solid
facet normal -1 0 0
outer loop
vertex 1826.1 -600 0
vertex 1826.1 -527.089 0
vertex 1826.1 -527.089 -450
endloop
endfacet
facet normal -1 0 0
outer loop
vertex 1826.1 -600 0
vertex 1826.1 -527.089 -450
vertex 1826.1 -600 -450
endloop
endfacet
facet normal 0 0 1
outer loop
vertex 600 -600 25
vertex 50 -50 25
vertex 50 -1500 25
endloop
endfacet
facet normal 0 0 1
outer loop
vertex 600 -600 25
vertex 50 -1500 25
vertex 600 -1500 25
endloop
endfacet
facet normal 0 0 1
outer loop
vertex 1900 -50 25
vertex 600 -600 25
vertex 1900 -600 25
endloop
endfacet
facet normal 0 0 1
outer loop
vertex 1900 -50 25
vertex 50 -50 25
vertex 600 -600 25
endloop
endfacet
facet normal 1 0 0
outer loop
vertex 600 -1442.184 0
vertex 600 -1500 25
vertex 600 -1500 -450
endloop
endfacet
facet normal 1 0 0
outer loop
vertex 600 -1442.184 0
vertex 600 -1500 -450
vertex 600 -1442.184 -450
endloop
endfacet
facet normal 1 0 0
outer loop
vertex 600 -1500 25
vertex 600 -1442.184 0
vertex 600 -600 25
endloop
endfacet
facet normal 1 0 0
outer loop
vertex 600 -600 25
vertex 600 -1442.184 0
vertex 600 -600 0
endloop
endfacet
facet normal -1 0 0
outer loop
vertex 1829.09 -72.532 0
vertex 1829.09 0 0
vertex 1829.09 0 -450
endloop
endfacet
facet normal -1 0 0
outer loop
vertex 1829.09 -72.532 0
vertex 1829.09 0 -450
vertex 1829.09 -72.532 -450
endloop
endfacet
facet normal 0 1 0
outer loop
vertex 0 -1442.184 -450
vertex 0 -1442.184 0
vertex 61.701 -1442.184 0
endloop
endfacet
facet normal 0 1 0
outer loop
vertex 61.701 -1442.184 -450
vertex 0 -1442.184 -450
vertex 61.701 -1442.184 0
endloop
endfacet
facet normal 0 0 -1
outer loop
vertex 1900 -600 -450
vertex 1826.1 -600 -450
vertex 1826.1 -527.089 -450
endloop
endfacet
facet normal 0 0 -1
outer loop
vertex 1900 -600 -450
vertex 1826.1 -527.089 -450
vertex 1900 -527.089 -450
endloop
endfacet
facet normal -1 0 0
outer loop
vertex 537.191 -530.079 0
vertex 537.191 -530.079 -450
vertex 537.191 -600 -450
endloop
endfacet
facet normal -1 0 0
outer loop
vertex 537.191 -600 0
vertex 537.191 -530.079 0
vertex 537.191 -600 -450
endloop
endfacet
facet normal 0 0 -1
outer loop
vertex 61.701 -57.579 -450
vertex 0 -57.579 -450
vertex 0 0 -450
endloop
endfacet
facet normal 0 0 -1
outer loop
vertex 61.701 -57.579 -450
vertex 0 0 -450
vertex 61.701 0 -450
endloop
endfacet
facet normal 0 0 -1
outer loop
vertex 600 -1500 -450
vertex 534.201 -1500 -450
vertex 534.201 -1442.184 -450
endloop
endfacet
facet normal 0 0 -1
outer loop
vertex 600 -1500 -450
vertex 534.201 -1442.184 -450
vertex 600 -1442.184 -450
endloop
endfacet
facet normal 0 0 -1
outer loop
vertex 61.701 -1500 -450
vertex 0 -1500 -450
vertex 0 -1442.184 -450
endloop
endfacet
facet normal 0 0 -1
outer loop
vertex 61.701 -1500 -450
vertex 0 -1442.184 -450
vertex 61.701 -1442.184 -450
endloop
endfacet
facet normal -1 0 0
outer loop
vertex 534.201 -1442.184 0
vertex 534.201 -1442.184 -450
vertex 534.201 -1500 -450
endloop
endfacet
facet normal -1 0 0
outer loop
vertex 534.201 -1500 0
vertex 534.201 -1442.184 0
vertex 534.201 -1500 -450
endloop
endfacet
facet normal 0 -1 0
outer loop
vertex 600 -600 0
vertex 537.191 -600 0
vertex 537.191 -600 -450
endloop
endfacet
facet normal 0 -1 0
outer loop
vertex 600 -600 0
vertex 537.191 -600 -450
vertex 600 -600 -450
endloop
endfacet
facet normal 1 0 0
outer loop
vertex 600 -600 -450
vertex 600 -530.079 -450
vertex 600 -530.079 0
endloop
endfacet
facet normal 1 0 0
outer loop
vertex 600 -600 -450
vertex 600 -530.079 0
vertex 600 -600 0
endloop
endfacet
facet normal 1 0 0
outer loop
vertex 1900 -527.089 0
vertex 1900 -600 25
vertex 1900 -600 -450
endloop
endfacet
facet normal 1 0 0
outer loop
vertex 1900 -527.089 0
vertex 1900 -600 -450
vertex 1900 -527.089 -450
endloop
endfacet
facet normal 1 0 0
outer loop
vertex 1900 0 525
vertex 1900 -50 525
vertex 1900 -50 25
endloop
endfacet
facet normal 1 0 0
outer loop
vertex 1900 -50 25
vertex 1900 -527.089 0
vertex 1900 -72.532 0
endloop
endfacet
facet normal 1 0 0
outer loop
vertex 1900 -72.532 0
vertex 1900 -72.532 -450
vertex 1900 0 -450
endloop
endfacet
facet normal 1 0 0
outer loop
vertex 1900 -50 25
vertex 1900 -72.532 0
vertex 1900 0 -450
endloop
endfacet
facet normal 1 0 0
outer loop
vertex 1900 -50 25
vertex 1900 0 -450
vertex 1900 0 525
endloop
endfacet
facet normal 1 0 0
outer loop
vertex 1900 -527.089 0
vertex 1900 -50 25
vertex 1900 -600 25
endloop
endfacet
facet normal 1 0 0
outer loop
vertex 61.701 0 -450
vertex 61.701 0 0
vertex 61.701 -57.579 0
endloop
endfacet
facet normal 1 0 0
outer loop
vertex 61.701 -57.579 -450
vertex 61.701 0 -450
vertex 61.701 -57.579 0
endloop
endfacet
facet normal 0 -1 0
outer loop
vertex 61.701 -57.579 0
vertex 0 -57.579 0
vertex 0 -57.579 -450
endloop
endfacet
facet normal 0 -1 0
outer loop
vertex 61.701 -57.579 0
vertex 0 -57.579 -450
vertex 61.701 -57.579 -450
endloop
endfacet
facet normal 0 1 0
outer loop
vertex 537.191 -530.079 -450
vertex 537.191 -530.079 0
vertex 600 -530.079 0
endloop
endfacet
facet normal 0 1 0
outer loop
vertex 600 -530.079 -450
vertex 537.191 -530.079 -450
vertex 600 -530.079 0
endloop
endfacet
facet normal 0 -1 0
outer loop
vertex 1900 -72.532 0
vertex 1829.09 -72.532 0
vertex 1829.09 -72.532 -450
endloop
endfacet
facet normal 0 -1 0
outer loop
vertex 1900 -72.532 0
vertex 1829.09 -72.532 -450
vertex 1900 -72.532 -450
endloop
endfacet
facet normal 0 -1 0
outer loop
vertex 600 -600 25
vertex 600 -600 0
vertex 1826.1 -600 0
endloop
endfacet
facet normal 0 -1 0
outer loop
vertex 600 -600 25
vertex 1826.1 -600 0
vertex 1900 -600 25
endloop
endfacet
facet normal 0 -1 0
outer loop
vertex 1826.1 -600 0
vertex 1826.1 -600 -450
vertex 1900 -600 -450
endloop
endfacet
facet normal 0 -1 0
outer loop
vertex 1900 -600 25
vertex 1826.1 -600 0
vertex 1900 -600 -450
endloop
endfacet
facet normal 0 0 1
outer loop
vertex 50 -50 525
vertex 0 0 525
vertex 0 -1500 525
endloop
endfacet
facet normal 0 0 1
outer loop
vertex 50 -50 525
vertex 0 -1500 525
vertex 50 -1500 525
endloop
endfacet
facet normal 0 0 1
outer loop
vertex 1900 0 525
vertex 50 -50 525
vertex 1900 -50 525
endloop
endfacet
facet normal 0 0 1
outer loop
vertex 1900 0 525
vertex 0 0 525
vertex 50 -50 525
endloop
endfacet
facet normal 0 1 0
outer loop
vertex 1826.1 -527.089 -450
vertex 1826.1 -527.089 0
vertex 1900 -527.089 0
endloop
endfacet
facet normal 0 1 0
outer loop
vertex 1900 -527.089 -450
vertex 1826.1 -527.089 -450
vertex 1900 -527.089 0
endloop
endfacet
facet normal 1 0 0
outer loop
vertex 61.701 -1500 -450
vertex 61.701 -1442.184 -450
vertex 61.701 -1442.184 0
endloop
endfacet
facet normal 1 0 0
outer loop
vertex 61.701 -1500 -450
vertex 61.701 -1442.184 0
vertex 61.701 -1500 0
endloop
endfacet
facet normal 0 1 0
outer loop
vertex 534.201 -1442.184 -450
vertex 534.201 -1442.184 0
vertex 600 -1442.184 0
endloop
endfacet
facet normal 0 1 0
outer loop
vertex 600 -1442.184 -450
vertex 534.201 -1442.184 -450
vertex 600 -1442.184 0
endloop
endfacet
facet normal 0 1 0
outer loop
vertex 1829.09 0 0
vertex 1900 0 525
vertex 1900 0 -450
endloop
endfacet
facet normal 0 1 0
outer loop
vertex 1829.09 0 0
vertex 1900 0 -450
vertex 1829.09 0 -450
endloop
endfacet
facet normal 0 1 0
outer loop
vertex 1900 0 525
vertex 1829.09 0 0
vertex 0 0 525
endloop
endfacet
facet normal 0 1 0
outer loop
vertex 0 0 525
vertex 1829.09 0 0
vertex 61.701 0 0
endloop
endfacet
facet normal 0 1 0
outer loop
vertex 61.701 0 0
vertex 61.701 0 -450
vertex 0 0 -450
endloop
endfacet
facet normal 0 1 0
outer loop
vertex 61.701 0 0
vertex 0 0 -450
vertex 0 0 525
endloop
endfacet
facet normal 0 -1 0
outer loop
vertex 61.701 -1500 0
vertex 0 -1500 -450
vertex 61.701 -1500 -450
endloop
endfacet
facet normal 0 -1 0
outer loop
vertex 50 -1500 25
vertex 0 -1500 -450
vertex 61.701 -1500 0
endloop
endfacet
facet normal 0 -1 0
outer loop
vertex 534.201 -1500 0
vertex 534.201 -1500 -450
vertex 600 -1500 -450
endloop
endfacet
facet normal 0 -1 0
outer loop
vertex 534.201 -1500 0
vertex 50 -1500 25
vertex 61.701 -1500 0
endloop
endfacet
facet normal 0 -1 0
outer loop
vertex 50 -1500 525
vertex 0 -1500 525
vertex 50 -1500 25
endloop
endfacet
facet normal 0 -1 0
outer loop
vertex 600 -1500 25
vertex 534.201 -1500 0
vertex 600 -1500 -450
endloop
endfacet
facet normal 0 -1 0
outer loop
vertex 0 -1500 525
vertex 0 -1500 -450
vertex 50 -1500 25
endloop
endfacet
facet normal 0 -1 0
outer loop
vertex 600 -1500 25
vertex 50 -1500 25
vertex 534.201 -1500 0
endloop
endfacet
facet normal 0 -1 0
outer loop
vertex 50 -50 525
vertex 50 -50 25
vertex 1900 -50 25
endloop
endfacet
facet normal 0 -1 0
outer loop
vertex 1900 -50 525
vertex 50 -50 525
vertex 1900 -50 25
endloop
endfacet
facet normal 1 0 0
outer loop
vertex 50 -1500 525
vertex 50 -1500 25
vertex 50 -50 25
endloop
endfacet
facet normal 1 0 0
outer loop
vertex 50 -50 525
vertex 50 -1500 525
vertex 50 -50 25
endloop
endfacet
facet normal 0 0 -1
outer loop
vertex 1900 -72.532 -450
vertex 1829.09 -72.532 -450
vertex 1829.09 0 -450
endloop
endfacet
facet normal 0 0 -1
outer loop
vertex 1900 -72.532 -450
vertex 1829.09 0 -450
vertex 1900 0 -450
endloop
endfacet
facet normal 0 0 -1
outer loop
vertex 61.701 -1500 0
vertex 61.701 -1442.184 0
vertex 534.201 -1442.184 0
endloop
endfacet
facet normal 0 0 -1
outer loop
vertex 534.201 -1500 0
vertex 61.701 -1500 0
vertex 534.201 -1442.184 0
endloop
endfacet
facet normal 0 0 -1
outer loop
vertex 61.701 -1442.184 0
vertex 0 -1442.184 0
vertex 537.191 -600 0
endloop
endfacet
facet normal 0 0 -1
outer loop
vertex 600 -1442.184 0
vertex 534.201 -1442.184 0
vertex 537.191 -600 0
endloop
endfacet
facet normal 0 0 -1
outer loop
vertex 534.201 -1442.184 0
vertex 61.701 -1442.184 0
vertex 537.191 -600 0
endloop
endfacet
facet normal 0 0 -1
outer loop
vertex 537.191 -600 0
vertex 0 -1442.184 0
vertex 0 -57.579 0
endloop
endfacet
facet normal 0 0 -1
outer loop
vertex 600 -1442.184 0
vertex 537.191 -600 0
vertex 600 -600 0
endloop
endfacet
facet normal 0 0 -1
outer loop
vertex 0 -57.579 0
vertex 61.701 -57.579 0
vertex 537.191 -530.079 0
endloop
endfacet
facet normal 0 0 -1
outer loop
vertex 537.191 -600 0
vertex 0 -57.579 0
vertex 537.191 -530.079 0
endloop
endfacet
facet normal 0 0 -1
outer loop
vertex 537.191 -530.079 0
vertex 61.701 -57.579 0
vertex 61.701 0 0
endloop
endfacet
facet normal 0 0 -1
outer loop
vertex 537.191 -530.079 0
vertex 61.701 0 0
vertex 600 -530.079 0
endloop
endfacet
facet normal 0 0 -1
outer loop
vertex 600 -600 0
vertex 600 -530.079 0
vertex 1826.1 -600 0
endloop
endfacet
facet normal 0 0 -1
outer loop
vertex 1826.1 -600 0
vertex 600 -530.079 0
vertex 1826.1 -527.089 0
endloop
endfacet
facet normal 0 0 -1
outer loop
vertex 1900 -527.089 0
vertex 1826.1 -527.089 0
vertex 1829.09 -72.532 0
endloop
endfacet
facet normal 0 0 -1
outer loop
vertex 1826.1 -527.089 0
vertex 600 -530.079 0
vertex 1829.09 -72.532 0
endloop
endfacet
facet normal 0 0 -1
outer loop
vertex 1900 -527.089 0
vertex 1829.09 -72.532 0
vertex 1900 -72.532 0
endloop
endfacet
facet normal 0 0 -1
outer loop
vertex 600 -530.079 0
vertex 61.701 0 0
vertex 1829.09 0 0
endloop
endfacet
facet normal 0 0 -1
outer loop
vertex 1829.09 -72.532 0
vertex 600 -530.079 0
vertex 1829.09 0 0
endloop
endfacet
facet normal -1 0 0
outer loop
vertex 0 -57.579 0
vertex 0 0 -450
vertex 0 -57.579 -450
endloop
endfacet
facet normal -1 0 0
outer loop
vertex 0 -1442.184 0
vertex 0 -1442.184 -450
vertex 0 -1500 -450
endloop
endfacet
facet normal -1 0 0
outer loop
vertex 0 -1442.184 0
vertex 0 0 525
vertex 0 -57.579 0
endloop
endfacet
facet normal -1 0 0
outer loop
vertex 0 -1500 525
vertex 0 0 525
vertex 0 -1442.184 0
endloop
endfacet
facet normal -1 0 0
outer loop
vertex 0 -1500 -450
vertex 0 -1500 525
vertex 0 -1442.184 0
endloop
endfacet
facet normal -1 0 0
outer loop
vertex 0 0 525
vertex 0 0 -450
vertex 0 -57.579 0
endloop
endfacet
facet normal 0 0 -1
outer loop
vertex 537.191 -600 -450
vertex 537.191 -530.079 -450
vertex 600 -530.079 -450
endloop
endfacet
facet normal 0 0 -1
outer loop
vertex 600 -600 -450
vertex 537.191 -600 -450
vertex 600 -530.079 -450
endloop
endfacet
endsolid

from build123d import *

# Parameters (mm, degrees)
F1_DEPTH = 25
F3_DEPTH = 500
F4_W     = 61.7009438574
F4_H     = 57.8163862228
F4_W_2   = 65.7990336418
F4_W_3   = 62.8085494041
F4_H_2   = 69.920873642
F4_H_3   = 57.5791224837
F4_W_4   = 73.9003658295
F4_H_4   = 72.9114174843
F4_W_5   = 70.9098815918
F4_H_5   = 72.5316330791
F5_DEPTH = 450


with BuildPart() as f1:
    # F0 (on Top) → F1 (new body)
    with BuildSketch(Plane.XY):
        Polygon((1900, 0), (0, 0), (0, -600), (0, -1500), (600, -1500), (600, -600), (1900, -600), align=None)
    extrude(amount=F1_DEPTH)

    # F2 (on face) → F3 (join)
    with BuildSketch(Plane.XY.offset(25)):
        Polygon((1900, -50), (1900, 0), (0, 0), (0, -50), (0, -231.5181791782), (0, -1500), (50, -1500), (50, -50), align=None)
    extrude(amount=F3_DEPTH)

    # F4 (on face) → F5 (join)
    with BuildSketch(Plane(origin=(0, 0, 0), x_dir=(1, 0, 0), z_dir=(0, 0, -1))):
        with Locations((30.8504719287, 1471.0918068886)):
            Rectangle(F4_W, F4_H)
        with Locations((567.1004831791, 1471.0918068886)):
            Rectangle(F4_W_2, F4_H)
        with Locations((568.5957252979, 565.039563179)):
            Rectangle(F4_W_3, F4_H_2)
        with Locations((30.8504719287, 28.7895612419)):
            Rectangle(F4_W, F4_H_3)
        with Locations((1863.0498170853, 563.5442912579)):
            Rectangle(F4_W_4, F4_H_4)
        with Locations((1864.5450592041, 36.2658165395)):
            Rectangle(F4_W_5, F4_H_5)
    extrude(amount=F5_DEPTH)


solid = f1.part
